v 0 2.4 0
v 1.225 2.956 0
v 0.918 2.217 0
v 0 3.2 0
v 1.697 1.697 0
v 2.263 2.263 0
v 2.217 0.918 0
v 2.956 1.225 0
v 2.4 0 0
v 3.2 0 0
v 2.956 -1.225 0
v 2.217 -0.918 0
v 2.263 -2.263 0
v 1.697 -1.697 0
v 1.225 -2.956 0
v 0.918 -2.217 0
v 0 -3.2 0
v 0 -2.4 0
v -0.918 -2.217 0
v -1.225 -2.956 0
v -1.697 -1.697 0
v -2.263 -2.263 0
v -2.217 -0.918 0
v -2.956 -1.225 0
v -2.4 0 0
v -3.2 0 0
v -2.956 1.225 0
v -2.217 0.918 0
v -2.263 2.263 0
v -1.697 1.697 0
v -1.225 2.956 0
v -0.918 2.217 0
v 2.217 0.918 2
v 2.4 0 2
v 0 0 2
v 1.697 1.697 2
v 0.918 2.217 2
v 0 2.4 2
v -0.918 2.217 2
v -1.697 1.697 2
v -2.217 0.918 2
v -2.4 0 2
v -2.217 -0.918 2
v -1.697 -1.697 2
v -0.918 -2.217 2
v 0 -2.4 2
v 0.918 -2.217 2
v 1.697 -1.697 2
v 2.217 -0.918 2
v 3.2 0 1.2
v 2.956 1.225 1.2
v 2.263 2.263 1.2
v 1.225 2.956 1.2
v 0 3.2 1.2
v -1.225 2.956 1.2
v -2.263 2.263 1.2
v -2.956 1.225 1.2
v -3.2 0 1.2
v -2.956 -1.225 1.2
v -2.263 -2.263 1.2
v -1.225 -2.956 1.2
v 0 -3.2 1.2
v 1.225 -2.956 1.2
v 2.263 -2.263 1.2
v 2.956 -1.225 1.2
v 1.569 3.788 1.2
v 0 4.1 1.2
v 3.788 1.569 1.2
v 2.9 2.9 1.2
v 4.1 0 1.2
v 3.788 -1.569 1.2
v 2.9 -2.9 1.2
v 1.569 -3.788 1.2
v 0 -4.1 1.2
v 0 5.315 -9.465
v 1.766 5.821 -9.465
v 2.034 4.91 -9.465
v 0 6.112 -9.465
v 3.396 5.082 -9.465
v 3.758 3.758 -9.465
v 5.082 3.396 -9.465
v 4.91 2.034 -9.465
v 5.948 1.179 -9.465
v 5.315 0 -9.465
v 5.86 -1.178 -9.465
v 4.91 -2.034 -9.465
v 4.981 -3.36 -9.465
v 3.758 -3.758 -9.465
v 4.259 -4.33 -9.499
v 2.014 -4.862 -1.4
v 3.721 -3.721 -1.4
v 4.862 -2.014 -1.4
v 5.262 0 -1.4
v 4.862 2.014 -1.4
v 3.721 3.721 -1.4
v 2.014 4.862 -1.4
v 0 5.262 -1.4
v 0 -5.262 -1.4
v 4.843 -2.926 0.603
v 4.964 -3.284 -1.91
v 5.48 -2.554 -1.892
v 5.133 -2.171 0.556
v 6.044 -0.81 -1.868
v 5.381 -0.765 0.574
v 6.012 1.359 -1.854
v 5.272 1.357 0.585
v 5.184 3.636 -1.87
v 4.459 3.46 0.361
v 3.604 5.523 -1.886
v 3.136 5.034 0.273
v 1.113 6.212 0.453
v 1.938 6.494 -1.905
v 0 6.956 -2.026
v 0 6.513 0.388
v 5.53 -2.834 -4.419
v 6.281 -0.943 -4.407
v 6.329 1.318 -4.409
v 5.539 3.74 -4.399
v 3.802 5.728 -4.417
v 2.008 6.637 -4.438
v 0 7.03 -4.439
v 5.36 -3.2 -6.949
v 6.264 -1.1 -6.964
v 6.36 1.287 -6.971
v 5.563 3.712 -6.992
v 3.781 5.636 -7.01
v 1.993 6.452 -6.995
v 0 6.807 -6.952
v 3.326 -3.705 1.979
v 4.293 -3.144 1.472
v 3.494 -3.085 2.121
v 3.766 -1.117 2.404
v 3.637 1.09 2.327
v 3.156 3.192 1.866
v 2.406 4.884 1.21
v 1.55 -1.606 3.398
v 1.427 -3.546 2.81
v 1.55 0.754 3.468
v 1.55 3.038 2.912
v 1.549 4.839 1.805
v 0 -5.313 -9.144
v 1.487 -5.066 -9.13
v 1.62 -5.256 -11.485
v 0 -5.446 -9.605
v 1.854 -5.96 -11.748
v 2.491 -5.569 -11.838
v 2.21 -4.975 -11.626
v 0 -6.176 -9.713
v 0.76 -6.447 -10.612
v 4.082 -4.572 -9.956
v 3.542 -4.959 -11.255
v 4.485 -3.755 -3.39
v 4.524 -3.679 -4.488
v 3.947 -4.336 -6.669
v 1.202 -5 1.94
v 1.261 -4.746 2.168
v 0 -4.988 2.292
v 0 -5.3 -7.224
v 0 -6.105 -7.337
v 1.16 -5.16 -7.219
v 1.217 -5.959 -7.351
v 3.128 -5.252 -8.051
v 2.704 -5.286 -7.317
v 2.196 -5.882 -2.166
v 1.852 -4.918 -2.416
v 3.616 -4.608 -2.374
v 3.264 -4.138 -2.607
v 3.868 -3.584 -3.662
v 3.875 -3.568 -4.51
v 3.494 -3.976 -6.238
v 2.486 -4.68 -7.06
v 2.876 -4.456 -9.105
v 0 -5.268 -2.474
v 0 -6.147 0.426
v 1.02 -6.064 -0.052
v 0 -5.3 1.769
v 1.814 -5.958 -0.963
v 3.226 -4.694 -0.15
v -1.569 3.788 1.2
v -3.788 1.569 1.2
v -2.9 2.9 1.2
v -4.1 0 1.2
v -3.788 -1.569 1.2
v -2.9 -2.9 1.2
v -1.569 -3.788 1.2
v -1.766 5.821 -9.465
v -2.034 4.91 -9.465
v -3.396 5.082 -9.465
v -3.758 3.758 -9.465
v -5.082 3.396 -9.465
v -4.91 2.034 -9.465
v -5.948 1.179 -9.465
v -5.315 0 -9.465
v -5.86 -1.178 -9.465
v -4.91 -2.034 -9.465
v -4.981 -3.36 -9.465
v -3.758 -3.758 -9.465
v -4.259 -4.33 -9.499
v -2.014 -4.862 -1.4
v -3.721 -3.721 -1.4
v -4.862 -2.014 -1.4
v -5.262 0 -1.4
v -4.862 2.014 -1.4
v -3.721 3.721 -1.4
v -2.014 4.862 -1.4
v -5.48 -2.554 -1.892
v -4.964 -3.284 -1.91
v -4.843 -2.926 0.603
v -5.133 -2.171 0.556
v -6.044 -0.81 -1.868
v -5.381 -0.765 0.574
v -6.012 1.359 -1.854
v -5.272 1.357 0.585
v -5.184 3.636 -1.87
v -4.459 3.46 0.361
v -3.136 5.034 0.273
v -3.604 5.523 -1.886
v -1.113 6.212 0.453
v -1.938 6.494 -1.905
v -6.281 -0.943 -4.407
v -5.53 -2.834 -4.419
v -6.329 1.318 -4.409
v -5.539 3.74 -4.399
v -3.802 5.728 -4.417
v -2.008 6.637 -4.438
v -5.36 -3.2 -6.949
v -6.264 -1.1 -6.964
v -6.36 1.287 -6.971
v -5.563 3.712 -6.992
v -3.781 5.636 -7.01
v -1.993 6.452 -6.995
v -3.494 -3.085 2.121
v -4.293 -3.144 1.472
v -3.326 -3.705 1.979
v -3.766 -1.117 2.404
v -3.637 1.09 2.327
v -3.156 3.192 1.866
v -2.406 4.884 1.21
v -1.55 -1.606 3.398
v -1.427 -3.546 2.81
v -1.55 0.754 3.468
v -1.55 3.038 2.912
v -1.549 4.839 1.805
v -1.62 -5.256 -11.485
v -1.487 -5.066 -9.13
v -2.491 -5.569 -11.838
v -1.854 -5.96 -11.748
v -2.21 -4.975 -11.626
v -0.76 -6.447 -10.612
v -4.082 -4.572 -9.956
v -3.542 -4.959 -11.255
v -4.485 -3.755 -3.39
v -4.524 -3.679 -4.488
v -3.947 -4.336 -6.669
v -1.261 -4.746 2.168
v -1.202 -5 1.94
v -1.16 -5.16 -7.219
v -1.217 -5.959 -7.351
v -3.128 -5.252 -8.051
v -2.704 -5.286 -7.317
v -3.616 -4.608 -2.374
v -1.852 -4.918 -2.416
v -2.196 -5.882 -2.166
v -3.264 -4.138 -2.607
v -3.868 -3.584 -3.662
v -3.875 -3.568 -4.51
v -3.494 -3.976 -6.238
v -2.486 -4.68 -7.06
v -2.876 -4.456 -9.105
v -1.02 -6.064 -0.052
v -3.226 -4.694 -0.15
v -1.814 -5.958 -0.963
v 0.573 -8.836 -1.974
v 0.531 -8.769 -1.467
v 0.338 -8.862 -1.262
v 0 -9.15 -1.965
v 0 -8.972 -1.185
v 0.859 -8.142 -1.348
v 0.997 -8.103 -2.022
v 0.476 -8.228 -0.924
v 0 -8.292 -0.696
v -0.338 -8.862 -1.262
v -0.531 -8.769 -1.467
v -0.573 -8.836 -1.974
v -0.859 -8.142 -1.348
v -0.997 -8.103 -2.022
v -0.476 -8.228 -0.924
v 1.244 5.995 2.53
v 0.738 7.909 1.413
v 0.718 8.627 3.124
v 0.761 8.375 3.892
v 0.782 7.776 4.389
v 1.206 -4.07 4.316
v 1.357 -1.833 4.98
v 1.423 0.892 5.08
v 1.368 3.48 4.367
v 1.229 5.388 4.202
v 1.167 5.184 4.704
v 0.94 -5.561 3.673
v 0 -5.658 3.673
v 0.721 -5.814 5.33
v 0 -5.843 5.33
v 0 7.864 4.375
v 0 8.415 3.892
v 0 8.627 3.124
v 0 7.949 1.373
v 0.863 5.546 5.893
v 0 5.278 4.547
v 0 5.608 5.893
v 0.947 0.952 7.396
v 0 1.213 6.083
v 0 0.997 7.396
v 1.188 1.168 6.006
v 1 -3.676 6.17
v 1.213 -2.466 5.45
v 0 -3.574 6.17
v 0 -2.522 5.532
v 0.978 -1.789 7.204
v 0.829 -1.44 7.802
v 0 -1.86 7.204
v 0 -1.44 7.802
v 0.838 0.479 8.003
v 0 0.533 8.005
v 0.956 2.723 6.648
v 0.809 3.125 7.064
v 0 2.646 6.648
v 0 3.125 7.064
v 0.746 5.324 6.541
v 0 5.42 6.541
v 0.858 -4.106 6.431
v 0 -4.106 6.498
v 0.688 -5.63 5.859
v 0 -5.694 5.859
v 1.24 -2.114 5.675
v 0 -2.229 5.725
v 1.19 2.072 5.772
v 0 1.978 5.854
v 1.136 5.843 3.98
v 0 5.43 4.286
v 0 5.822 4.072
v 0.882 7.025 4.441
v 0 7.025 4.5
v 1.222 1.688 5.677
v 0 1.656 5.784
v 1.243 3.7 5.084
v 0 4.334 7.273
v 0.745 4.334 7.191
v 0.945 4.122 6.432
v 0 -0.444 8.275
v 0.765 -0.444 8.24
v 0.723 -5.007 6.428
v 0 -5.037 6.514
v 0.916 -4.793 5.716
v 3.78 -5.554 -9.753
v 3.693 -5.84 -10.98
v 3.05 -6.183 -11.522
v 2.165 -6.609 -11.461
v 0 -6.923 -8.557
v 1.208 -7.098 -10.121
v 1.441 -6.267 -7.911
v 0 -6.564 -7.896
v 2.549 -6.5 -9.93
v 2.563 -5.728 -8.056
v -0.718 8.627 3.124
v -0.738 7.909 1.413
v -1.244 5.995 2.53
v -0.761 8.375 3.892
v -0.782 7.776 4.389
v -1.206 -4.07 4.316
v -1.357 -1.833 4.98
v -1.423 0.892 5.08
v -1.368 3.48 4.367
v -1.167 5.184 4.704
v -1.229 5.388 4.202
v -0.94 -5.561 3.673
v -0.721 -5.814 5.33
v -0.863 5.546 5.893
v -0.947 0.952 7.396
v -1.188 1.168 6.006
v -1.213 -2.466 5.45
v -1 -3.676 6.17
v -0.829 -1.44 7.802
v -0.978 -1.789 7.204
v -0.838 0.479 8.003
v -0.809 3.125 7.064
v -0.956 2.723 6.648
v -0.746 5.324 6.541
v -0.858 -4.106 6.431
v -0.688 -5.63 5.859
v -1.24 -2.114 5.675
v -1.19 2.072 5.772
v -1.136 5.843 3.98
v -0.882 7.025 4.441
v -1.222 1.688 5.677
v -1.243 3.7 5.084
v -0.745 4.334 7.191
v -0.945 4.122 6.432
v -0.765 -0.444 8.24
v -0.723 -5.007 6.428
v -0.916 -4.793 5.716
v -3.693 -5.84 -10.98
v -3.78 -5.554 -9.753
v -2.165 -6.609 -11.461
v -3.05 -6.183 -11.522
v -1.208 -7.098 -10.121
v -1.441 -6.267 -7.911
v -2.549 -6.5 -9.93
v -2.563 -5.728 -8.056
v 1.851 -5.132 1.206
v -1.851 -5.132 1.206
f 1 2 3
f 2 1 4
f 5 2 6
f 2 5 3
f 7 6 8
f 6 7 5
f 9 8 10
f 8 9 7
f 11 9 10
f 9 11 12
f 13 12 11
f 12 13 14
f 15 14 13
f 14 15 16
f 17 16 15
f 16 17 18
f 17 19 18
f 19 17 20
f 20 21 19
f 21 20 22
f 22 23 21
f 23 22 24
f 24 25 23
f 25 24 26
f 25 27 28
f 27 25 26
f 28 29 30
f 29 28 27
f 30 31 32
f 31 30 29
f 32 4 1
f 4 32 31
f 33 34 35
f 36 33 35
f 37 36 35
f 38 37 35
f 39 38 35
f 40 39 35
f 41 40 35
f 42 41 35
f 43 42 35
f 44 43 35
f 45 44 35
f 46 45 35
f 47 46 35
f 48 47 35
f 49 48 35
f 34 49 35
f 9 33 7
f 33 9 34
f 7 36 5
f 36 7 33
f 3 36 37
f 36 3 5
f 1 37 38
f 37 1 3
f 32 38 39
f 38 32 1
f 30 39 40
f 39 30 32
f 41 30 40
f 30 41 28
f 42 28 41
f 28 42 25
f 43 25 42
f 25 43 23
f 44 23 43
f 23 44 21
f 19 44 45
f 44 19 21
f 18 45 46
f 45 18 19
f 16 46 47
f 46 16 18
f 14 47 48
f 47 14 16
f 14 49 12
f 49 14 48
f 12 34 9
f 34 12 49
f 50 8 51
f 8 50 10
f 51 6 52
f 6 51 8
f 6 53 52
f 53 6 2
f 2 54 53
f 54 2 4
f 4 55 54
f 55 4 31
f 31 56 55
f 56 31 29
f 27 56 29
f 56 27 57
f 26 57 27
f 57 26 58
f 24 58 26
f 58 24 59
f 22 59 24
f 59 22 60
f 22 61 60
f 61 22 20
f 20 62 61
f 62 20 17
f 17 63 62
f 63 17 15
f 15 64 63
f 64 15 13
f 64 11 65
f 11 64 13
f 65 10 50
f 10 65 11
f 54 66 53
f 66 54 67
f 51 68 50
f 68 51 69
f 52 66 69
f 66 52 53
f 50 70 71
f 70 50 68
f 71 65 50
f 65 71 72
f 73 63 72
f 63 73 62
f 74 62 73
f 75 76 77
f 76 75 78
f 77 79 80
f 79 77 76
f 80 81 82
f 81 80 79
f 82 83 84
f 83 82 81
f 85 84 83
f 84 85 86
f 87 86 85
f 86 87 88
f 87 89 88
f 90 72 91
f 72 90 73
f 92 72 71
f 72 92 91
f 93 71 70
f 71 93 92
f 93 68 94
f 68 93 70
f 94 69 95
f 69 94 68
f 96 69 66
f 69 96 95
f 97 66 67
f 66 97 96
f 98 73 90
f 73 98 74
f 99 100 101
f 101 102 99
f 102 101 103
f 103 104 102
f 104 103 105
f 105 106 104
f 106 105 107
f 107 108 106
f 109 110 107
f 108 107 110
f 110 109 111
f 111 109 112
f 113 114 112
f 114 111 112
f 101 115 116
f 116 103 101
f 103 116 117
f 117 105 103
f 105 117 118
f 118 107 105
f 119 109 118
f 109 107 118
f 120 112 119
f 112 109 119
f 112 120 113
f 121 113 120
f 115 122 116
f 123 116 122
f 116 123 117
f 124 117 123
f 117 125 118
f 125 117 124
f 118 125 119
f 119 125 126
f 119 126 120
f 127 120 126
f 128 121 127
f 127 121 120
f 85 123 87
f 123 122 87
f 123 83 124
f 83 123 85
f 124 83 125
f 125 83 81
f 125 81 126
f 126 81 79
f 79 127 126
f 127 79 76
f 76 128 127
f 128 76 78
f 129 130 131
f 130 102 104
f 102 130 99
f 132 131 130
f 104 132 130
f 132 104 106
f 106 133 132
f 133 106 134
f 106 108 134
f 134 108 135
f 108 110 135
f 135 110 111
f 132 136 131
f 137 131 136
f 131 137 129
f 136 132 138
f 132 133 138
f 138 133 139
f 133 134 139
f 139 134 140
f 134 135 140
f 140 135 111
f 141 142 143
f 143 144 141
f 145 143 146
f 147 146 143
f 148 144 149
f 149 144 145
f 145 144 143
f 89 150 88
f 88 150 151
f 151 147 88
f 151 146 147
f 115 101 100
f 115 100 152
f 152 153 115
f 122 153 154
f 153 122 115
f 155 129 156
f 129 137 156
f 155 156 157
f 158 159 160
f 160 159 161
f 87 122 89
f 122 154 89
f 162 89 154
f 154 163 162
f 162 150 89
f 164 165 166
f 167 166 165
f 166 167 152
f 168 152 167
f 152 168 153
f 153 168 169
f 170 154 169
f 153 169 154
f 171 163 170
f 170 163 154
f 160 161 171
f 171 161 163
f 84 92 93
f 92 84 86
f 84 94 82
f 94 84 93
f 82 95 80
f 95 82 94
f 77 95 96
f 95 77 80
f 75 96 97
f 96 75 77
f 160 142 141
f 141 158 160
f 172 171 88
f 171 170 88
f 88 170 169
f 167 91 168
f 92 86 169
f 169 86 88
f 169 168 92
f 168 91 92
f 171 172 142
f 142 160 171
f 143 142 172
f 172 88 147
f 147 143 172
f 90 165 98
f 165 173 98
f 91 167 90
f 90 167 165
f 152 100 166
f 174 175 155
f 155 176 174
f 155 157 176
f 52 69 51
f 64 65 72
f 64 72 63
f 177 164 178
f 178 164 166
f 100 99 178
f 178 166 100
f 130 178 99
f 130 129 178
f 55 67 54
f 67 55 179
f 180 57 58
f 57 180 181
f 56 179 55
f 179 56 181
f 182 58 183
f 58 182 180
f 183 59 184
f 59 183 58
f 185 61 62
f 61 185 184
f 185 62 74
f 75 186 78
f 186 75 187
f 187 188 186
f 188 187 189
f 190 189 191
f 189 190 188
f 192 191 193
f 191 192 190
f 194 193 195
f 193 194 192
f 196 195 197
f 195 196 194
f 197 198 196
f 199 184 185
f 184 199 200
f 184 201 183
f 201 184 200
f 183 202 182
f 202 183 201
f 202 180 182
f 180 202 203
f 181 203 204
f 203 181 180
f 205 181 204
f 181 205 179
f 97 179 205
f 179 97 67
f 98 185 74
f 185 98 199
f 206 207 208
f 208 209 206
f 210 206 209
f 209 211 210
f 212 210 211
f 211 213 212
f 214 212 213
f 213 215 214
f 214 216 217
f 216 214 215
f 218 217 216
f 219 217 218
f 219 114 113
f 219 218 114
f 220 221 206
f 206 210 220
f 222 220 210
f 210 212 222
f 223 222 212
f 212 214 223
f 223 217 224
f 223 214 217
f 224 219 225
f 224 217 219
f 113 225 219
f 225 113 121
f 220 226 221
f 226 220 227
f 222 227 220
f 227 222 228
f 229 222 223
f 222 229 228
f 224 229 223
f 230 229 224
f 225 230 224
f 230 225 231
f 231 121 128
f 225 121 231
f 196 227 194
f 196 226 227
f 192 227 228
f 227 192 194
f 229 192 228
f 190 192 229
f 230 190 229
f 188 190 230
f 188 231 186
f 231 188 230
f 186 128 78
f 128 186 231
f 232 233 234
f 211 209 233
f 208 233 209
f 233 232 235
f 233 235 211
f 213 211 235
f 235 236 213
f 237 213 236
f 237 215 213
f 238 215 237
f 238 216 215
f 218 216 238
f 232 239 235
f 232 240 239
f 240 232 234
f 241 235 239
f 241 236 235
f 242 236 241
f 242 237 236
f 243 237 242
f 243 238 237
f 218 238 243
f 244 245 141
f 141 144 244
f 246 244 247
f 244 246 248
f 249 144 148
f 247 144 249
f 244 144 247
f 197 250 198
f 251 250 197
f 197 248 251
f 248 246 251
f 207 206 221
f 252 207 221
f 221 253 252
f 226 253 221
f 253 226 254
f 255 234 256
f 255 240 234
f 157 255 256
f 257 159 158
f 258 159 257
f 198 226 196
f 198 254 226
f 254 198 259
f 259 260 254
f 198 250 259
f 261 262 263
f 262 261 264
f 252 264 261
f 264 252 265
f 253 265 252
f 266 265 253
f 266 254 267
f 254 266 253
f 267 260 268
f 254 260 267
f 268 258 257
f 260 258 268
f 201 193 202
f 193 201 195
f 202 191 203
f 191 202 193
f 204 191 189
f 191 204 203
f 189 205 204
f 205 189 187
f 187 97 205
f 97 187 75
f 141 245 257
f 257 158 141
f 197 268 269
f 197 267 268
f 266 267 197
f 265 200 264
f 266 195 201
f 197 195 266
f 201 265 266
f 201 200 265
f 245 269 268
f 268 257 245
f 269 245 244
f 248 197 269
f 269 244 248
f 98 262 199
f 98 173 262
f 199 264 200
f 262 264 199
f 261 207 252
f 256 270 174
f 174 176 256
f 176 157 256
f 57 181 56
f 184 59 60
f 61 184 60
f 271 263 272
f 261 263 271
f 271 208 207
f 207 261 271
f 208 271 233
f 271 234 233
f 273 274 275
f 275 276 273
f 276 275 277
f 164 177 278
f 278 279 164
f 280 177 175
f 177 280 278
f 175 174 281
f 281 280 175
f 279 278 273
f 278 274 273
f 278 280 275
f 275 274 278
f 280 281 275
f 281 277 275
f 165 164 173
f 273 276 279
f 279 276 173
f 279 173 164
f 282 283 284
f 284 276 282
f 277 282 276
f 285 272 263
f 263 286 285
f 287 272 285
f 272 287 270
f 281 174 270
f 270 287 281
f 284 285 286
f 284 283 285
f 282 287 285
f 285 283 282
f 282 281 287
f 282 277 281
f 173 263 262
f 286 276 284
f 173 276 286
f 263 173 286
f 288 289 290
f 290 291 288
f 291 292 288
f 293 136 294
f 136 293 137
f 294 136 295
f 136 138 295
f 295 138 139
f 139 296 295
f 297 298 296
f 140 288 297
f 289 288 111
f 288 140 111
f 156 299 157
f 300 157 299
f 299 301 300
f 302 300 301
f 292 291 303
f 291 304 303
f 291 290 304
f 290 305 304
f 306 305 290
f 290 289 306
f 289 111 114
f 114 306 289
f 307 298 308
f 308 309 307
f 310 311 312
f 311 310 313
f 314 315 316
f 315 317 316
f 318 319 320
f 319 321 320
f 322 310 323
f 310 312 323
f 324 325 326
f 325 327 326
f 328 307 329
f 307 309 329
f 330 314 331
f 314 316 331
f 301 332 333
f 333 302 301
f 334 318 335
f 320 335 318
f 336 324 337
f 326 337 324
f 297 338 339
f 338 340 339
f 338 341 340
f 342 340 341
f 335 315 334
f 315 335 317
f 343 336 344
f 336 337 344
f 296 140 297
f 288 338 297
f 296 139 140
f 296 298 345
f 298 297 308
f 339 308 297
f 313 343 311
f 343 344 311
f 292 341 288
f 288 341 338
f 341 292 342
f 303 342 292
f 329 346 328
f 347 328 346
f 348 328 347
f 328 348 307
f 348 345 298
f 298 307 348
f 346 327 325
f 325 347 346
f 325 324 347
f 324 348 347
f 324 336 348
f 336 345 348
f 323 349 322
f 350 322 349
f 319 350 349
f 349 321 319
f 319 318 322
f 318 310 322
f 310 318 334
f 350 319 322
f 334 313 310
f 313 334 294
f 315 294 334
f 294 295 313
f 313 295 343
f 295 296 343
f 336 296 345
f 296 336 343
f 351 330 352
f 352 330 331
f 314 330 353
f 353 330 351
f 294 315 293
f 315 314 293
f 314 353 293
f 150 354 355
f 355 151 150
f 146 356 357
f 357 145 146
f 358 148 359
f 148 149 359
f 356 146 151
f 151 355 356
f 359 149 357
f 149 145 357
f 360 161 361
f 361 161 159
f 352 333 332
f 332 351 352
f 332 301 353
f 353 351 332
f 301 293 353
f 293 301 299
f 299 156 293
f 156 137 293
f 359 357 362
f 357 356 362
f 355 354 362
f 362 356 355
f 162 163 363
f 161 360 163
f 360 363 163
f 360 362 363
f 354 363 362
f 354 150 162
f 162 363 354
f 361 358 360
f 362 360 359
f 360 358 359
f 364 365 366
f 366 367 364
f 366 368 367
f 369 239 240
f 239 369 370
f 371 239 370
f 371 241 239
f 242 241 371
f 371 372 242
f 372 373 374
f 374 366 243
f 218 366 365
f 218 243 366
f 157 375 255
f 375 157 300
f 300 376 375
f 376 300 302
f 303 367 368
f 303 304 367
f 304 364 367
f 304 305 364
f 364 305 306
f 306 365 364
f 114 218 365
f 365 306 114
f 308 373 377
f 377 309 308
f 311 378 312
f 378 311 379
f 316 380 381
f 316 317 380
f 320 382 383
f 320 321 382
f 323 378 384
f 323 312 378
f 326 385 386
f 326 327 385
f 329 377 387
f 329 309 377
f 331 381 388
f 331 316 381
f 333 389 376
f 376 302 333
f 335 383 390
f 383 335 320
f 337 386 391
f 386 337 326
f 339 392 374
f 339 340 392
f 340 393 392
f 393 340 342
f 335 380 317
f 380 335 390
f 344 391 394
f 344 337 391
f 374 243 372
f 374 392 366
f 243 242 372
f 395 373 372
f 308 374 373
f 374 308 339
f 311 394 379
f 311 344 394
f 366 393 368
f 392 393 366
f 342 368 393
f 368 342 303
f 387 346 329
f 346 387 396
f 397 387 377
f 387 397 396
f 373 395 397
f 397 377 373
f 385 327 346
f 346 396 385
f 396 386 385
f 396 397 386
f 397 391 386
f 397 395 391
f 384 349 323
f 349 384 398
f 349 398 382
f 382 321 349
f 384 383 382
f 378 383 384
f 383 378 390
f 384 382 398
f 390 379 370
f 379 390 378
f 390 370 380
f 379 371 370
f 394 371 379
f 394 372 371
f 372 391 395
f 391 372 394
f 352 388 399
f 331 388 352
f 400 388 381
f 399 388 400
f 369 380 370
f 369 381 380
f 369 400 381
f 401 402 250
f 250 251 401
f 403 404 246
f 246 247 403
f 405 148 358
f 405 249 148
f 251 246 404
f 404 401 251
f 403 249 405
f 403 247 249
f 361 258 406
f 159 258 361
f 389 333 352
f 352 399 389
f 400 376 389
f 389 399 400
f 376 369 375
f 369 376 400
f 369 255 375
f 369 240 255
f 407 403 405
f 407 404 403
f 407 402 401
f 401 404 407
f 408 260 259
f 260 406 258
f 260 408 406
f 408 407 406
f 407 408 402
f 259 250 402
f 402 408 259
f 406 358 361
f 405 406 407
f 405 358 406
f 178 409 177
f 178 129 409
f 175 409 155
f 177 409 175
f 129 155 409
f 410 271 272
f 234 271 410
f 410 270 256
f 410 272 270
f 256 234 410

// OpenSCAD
use <../lib.scad>
use <../p/4-4cylo.scad>
use <s/11262s01.scad>
use <s/11262s02.scad>
use <s/11262s03.scad>
use <../p/stud4o.scad>
$fa=1; $fs=0.2;
function ldraw_lib__11262(realsolid=false) = [
// 0 Minifig Headdress Chicken
// 0 Name: 11262.dat
// 0 Author: Philippe Hurbain [Philo]
// 0 !LDRAW_ORG Part UPDATE 2020-02
// 0 !LICENSE Licensed under CC BY 2.0 and CC BY 4.0 : see CAreadme.txt
// 
// 0 BFC CERTIFY CCW
  [0,"BFC","CERTIFY"],
  [0,"BFC","CCW"],
// 
// 0 !CATEGORY Minifig Headwear
// 
// 0 !HISTORY 2013-08-14 {LEGO Digital Designer} Original part shape
// 0 !HISTORY 2019-05-19 [Philo] File preparation for LDraw Parts Tracker
// 0 !HISTORY 2020-09-05 [PTadmin] Official Update 2020-02
// 
// 
// 1 16 0 -5 0 -1 0 0 0 -1.25 0 0 0 1 stud4o.dat
  [1,16,0,-5,0,-1,0,0,0,-1.25,0,0,0,1, ldraw_lib__stud4o(realsolid)],
// 1 16 0 -3 0 8 0 0 0 3 0 0 0 8 4-4cylo.dat
  [1,16,0,-3,0,8,0,0,0,3,0,0,0,8, ldraw_lib__4_4cylo(realsolid)],
// 1 16 0 0 0 1 0 0 0 1 0 0 0 1 s\11262s01.dat
  [1,16,0,0,0,1,0,0,0,1,0,0,0,1, ldraw_lib__s__11262s01(realsolid)],
// 1 16 0 0 0 -1 0 0 0 1 0 0 0 1 s\11262s01.dat
  [1,16,0,0,0,-1,0,0,0,1,0,0,0,1, ldraw_lib__s__11262s01(realsolid)],
// 1 16 0 0 0 1 0 0 0 1 0 0 0 1 s\11262s02.dat
  [1,16,0,0,0,1,0,0,0,1,0,0,0,1, ldraw_lib__s__11262s02(realsolid)],
// 1 16 0 0 0 -1 0 0 0 1 0 0 0 1 s\11262s02.dat
  [1,16,0,0,0,-1,0,0,0,1,0,0,0,1, ldraw_lib__s__11262s02(realsolid)],
// 1 16 0 0 0 1 0 0 0 1 0 0 0 1 s\11262s03.dat
  [1,16,0,0,0,1,0,0,0,1,0,0,0,1, ldraw_lib__s__11262s03(realsolid)],
// 1 16 0 0 0 -1 0 0 0 1 0 0 0 1 s\11262s03.dat
  [1,16,0,0,0,-1,0,0,0,1,0,0,0,1, ldraw_lib__s__11262s03(realsolid)],
// 0 // eyes areas
// 3 16 8.064 0.375 -11.734 4.628 -3.015 -12.831 4.534 2.407 -14.896
  [3,16,8.064,0.375,-11.734,4.628,-3.015,-12.831,4.534,2.407,-14.896],
// 3 16 8.064 0.375 -11.734 8.316 -4.947 -9.262 4.628 -3.015 -12.831
  [3,16,8.064,0.375,-11.734,8.316,-4.947,-9.262,4.628,-3.015,-12.831],
// 3 16 2.549 0.131 -15.159 4.628 -3.015 -12.831 3.004 -4.851 -12.5
  [3,16,2.549,0.131,-15.159,4.628,-3.015,-12.831,3.004,-4.851,-12.5],
// 3 16 4.534 2.407 -14.896 4.628 -3.015 -12.831 2.549 0.131 -15.159
  [3,16,4.534,2.407,-14.896,4.628,-3.015,-12.831,2.549,0.131,-15.159],
// 3 16 8.316 -4.947 -9.262 3.004 -4.851 -12.5 4.628 -3.015 -12.831
  [3,16,8.316,-4.947,-9.262,3.004,-4.851,-12.5,4.628,-3.015,-12.831],
// 5 24 2.549 0.131 -15.159 4.628 -3.015 -12.831 3.004 -4.851 -12.5 4.534 2.407 -14.896
  [5,24,2.549,0.131,-15.159,4.628,-3.015,-12.831,3.004,-4.851,-12.5,4.534,2.407,-14.896],
// 5 24 4.628 -3.015 -12.831 3.004 -4.851 -12.5 2.549 0.131 -15.159 8.316 -4.947 -9.262
  [5,24,4.628,-3.015,-12.831,3.004,-4.851,-12.5,2.549,0.131,-15.159,8.316,-4.947,-9.262],
// 5 24 4.628 -3.015 -12.831 4.534 2.407 -14.896 8.064 0.375 -11.734 2.549 0.131 -15.159
  [5,24,4.628,-3.015,-12.831,4.534,2.407,-14.896,8.064,0.375,-11.734,2.549,0.131,-15.159],
// 5 24 8.316 -4.947 -9.262 4.628 -3.015 -12.831 8.064 0.375 -11.734 3.004 -4.851 -12.5
  [5,24,8.316,-4.947,-9.262,4.628,-3.015,-12.831,8.064,0.375,-11.734,3.004,-4.851,-12.5],
// 5 24 4.628 -3.015 -12.831 8.064 0.375 -11.734 4.534 2.407 -14.896 8.316 -4.947 -9.262
  [5,24,4.628,-3.015,-12.831,8.064,0.375,-11.734,4.534,2.407,-14.896,8.316,-4.947,-9.262],
// 3 16 -4.628 -3.015 -12.831 -8.064 0.375 -11.734 -4.534 2.407 -14.896
  [3,16,-4.628,-3.015,-12.831,-8.064,0.375,-11.734,-4.534,2.407,-14.896],
// 3 16 -8.316 -4.947 -9.262 -8.064 0.375 -11.734 -4.628 -3.015 -12.831
  [3,16,-8.316,-4.947,-9.262,-8.064,0.375,-11.734,-4.628,-3.015,-12.831],
// 3 16 -4.628 -3.015 -12.831 -2.549 0.131 -15.159 -3.004 -4.851 -12.5
  [3,16,-4.628,-3.015,-12.831,-2.549,0.131,-15.159,-3.004,-4.851,-12.5],
// 3 16 -4.628 -3.015 -12.831 -4.534 2.407 -14.896 -2.549 0.131 -15.159
  [3,16,-4.628,-3.015,-12.831,-4.534,2.407,-14.896,-2.549,0.131,-15.159],
// 3 16 -3.004 -4.851 -12.5 -8.316 -4.947 -9.262 -4.628 -3.015 -12.831
  [3,16,-3.004,-4.851,-12.5,-8.316,-4.947,-9.262,-4.628,-3.015,-12.831],
// 5 24 -2.549 0.131 -15.159 -4.628 -3.015 -12.831 -3.004 -4.851 -12.5 -4.534 2.407 -14.896
  [5,24,-2.549,0.131,-15.159,-4.628,-3.015,-12.831,-3.004,-4.851,-12.5,-4.534,2.407,-14.896],
// 5 24 -4.628 -3.015 -12.831 -3.004 -4.851 -12.5 -2.549 0.131 -15.159 -8.316 -4.947 -9.262
  [5,24,-4.628,-3.015,-12.831,-3.004,-4.851,-12.5,-2.549,0.131,-15.159,-8.316,-4.947,-9.262],
// 5 24 -4.628 -3.015 -12.831 -4.534 2.407 -14.896 -8.064 0.375 -11.734 -2.549 0.131 -15.159
  [5,24,-4.628,-3.015,-12.831,-4.534,2.407,-14.896,-8.064,0.375,-11.734,-2.549,0.131,-15.159],
// 5 24 -8.316 -4.947 -9.262 -4.628 -3.015 -12.831 -8.064 0.375 -11.734 -3.004 -4.851 -12.5
  [5,24,-8.316,-4.947,-9.262,-4.628,-3.015,-12.831,-8.064,0.375,-11.734,-3.004,-4.851,-12.5],
// 5 24 -4.628 -3.015 -12.831 -8.064 0.375 -11.734 -4.534 2.407 -14.896 -8.316 -4.947 -9.262
  [5,24,-4.628,-3.015,-12.831,-8.064,0.375,-11.734,-4.534,2.407,-14.896,-8.316,-4.947,-9.262],
];
module ldraw_lib__11262(step=0, col=false, unit=2/5, alt=false, line=0.2, solid=!$preview)
    makepoly(ldraw_lib__11262(solid), step=step, col=col, unit=unit, alt=alt, line=line, solid=solid);
ldraw_lib__11262(line=0.2);
